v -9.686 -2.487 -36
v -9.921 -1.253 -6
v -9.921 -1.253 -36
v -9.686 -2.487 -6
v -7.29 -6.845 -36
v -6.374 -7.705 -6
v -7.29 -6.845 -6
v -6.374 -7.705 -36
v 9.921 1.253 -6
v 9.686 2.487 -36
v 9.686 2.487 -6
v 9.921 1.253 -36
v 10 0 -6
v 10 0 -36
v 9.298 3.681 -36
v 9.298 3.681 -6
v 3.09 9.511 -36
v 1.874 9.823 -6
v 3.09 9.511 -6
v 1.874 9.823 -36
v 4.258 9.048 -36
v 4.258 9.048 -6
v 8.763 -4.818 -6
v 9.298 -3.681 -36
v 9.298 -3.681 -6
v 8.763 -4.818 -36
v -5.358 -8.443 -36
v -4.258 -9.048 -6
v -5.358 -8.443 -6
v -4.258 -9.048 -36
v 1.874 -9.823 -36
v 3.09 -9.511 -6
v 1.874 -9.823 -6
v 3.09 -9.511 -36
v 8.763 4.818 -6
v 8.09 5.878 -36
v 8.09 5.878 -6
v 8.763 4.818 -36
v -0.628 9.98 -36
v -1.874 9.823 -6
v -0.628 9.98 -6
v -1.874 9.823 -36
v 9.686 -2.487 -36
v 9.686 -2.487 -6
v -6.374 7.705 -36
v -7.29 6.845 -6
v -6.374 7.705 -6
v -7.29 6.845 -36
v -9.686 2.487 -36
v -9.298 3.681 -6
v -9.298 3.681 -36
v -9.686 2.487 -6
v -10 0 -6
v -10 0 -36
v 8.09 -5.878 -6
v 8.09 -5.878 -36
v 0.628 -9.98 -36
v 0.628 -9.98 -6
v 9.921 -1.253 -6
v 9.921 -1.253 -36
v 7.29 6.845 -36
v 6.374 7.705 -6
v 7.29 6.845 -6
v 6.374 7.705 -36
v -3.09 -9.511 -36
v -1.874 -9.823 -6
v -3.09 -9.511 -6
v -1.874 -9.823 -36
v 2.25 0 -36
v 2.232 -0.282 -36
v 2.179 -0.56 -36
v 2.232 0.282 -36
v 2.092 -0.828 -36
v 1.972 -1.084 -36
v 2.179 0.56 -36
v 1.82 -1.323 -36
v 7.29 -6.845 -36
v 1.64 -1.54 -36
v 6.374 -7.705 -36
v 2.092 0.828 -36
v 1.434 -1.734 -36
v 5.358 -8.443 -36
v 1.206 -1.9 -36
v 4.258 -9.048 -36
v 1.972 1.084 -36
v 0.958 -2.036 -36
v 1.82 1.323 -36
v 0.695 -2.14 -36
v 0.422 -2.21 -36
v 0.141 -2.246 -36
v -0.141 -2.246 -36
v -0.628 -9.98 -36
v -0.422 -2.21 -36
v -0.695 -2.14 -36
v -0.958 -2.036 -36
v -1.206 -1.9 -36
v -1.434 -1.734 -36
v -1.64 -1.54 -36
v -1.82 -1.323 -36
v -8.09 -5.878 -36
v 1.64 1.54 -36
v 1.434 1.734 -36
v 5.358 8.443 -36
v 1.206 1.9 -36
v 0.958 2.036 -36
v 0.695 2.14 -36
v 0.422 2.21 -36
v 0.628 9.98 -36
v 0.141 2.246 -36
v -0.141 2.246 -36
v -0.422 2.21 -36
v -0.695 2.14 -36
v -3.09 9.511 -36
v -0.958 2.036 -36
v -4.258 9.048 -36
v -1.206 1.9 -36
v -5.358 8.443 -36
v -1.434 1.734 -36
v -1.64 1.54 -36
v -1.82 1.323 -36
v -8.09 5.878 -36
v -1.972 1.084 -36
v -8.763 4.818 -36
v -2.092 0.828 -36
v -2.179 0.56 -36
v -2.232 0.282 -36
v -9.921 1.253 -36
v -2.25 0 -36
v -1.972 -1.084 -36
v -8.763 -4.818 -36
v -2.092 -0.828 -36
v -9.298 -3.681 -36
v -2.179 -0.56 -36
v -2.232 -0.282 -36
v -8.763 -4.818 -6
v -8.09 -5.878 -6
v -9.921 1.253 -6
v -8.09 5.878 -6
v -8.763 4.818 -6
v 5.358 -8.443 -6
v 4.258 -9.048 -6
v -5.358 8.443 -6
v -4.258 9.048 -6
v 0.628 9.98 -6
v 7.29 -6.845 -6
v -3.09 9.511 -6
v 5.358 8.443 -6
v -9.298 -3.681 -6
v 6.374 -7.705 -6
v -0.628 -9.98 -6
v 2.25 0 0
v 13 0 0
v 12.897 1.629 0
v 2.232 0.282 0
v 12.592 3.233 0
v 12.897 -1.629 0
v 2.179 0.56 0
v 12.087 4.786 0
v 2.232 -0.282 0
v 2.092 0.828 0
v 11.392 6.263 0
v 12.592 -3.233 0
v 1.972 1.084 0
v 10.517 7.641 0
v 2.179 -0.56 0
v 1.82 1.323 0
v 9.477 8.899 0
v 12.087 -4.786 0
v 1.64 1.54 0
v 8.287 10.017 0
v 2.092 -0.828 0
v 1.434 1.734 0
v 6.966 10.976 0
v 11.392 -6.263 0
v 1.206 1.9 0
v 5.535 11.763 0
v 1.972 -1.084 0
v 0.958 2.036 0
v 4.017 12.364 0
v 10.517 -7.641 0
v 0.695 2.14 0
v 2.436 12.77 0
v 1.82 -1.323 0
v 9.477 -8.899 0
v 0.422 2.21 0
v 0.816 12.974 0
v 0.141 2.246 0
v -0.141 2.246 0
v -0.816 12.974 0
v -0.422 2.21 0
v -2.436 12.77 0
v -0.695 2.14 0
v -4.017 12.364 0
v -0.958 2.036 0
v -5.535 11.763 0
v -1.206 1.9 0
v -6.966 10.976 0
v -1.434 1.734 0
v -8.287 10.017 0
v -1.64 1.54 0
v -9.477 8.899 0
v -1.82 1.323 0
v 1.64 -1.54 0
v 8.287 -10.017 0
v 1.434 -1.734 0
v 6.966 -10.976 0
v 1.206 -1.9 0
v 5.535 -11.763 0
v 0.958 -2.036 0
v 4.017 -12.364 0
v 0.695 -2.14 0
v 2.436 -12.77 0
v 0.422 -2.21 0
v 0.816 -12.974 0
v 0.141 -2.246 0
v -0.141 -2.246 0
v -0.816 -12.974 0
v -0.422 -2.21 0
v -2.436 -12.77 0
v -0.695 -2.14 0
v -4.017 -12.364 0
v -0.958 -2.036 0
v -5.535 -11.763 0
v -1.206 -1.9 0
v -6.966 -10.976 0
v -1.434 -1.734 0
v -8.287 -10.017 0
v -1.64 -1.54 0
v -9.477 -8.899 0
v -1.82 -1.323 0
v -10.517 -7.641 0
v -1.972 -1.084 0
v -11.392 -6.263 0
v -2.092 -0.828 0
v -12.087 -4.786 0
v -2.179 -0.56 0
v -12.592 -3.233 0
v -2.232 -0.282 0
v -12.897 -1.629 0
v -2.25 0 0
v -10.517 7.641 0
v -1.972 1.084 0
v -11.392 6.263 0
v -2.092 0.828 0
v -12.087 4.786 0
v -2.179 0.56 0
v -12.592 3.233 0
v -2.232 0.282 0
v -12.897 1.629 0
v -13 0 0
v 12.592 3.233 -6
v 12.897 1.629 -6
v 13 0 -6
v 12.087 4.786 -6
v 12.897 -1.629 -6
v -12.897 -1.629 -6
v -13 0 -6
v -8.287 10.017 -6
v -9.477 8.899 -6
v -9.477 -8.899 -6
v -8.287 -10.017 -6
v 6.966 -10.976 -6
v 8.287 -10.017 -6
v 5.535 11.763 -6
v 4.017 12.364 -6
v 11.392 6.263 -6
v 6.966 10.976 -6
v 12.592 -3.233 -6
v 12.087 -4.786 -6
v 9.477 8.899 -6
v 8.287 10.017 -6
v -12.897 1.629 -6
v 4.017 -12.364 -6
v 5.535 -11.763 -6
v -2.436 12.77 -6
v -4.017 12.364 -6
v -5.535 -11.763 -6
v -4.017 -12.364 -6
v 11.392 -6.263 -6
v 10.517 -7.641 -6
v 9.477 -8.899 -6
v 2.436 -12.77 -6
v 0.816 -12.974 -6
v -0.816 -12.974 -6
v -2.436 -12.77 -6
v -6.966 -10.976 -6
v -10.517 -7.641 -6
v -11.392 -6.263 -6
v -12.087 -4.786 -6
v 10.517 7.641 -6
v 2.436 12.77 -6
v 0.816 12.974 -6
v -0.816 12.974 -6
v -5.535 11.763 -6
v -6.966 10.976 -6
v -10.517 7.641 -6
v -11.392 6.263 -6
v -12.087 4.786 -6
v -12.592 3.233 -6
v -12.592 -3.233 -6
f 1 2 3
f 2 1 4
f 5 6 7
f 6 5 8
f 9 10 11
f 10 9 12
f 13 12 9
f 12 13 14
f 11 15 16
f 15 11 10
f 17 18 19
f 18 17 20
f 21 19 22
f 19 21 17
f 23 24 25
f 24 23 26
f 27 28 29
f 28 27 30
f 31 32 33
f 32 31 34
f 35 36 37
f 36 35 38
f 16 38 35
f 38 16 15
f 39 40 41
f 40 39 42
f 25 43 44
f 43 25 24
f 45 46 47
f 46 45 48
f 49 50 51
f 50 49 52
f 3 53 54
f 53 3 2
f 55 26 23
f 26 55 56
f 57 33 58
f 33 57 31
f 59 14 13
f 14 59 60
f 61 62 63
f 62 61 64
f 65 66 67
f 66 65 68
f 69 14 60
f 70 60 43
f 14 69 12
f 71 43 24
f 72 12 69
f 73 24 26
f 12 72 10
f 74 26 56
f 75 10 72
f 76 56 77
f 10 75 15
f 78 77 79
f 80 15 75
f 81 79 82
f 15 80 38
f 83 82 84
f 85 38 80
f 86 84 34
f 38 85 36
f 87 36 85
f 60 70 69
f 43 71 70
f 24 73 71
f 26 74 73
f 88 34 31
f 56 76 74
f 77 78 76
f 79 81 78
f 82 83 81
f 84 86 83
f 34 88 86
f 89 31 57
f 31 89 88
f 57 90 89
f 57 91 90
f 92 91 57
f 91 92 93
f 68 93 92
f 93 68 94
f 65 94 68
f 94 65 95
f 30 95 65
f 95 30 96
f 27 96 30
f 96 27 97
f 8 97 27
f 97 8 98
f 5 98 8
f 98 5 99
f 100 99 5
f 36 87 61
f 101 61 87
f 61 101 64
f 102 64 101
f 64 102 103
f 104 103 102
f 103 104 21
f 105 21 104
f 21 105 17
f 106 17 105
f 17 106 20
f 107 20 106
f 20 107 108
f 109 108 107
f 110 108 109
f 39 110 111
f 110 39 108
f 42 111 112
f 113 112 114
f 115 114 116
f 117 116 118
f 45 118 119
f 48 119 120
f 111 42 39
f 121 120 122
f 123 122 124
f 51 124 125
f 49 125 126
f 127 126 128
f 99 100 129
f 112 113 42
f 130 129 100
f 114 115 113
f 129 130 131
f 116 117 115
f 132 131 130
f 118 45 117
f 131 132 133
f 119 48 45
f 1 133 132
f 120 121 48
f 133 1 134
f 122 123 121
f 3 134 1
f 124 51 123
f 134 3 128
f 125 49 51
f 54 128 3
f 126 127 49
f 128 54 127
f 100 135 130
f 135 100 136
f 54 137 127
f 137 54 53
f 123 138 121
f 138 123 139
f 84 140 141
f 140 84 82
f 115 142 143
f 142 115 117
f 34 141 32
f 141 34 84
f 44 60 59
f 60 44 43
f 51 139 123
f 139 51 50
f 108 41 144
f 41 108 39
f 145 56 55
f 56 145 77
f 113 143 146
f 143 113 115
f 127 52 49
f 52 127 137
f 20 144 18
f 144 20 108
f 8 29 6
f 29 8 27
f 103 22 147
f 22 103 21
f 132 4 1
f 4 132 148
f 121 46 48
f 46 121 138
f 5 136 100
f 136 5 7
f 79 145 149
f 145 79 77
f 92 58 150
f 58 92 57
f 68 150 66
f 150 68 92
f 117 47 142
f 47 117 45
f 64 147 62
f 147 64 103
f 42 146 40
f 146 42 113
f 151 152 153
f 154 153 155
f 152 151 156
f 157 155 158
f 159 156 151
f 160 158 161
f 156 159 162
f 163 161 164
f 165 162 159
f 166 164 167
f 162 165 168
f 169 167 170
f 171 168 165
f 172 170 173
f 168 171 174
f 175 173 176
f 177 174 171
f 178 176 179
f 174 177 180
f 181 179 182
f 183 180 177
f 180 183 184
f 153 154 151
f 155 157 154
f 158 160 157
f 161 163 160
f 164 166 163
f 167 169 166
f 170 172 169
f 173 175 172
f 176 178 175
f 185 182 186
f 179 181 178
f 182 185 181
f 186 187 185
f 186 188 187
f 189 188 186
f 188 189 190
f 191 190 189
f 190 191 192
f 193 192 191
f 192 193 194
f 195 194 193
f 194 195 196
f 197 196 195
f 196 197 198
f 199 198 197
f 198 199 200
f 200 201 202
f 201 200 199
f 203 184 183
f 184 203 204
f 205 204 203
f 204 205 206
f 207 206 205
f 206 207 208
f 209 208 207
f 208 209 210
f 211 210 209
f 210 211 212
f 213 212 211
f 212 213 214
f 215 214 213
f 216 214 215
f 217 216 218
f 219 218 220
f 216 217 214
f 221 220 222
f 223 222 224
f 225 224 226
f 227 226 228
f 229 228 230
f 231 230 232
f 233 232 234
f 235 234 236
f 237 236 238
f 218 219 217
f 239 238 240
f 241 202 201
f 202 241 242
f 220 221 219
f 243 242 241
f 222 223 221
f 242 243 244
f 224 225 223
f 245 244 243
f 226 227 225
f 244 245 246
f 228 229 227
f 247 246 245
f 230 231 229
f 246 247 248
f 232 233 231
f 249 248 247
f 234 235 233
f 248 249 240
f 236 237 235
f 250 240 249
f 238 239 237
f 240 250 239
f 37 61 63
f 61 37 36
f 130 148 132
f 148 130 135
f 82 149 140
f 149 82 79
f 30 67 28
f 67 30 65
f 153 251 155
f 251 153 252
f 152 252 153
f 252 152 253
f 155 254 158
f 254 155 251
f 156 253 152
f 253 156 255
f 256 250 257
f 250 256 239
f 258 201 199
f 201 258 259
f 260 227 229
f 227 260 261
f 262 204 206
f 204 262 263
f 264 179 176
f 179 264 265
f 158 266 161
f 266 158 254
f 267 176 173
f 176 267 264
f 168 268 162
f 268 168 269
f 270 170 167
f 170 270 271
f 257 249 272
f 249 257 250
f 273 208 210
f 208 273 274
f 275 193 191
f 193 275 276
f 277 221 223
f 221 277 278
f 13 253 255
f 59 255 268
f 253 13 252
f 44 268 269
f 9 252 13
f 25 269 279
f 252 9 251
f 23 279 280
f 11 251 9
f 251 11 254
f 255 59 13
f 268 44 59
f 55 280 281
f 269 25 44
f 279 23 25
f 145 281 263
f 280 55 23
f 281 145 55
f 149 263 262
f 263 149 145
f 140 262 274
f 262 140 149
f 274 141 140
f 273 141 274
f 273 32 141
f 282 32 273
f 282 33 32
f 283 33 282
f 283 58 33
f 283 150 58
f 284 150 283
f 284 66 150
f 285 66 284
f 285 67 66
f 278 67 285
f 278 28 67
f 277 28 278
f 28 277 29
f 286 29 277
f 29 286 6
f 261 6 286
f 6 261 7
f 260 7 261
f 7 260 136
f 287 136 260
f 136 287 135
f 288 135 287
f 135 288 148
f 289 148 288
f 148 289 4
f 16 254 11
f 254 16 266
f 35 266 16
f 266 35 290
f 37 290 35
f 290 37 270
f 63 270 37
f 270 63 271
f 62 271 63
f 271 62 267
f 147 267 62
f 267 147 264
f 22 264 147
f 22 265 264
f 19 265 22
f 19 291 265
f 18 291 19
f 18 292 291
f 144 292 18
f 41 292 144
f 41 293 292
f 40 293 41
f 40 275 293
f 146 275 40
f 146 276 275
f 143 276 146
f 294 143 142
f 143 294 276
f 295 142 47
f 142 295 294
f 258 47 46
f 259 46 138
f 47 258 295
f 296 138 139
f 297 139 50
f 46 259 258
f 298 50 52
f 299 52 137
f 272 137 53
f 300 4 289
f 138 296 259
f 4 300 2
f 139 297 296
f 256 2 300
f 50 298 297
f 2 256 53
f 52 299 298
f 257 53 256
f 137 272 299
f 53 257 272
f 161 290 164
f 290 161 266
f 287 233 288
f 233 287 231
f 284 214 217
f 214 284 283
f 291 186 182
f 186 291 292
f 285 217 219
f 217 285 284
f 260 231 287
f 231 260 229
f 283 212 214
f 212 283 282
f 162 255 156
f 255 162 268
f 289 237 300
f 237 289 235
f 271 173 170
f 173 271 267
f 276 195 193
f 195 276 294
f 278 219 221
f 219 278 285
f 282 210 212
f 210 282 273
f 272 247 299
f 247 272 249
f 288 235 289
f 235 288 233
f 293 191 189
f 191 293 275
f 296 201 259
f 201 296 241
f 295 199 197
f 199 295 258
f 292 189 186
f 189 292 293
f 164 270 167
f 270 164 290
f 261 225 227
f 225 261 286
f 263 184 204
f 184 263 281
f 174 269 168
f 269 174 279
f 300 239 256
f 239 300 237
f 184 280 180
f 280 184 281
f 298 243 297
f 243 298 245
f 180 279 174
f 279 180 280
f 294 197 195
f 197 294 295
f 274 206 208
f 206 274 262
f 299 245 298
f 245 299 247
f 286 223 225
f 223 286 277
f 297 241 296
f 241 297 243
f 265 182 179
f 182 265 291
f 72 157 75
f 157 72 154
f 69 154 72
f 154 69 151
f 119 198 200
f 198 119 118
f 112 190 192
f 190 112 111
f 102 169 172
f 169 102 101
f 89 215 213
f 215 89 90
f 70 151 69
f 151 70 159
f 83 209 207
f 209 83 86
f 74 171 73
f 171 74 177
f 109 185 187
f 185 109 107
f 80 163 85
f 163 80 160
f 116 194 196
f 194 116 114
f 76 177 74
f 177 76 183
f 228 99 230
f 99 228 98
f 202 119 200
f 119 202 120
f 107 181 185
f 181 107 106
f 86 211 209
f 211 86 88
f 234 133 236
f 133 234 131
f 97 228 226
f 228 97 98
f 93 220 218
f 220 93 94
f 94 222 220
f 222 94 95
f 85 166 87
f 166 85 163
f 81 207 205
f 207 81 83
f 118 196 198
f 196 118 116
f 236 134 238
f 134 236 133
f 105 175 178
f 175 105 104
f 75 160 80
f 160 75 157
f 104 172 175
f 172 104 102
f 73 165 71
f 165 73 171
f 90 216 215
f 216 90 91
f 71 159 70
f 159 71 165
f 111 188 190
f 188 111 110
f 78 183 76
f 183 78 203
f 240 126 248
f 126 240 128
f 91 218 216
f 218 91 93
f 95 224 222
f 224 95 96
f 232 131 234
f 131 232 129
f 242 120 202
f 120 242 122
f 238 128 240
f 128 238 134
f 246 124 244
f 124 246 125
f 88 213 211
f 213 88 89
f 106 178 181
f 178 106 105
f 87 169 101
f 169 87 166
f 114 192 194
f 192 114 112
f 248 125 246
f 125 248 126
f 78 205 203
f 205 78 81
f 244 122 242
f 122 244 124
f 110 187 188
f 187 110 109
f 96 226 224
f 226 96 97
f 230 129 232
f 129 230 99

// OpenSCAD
$fn = 50;


difference() {
	union() {
		translate(v = [0, 0, -36.0000000000]) {
			cylinder(h = 36, r = 10.0000000000);
		}
		translate(v = [0, 0, -6.0000000000]) {
			cylinder(h = 6, r = 13.0000000000);
		}
	}
	union() {
		#translate(v = [0, 0, -36]) {
			cylinder(h = 36, r = 2.2500000000);
		}
	}
}
